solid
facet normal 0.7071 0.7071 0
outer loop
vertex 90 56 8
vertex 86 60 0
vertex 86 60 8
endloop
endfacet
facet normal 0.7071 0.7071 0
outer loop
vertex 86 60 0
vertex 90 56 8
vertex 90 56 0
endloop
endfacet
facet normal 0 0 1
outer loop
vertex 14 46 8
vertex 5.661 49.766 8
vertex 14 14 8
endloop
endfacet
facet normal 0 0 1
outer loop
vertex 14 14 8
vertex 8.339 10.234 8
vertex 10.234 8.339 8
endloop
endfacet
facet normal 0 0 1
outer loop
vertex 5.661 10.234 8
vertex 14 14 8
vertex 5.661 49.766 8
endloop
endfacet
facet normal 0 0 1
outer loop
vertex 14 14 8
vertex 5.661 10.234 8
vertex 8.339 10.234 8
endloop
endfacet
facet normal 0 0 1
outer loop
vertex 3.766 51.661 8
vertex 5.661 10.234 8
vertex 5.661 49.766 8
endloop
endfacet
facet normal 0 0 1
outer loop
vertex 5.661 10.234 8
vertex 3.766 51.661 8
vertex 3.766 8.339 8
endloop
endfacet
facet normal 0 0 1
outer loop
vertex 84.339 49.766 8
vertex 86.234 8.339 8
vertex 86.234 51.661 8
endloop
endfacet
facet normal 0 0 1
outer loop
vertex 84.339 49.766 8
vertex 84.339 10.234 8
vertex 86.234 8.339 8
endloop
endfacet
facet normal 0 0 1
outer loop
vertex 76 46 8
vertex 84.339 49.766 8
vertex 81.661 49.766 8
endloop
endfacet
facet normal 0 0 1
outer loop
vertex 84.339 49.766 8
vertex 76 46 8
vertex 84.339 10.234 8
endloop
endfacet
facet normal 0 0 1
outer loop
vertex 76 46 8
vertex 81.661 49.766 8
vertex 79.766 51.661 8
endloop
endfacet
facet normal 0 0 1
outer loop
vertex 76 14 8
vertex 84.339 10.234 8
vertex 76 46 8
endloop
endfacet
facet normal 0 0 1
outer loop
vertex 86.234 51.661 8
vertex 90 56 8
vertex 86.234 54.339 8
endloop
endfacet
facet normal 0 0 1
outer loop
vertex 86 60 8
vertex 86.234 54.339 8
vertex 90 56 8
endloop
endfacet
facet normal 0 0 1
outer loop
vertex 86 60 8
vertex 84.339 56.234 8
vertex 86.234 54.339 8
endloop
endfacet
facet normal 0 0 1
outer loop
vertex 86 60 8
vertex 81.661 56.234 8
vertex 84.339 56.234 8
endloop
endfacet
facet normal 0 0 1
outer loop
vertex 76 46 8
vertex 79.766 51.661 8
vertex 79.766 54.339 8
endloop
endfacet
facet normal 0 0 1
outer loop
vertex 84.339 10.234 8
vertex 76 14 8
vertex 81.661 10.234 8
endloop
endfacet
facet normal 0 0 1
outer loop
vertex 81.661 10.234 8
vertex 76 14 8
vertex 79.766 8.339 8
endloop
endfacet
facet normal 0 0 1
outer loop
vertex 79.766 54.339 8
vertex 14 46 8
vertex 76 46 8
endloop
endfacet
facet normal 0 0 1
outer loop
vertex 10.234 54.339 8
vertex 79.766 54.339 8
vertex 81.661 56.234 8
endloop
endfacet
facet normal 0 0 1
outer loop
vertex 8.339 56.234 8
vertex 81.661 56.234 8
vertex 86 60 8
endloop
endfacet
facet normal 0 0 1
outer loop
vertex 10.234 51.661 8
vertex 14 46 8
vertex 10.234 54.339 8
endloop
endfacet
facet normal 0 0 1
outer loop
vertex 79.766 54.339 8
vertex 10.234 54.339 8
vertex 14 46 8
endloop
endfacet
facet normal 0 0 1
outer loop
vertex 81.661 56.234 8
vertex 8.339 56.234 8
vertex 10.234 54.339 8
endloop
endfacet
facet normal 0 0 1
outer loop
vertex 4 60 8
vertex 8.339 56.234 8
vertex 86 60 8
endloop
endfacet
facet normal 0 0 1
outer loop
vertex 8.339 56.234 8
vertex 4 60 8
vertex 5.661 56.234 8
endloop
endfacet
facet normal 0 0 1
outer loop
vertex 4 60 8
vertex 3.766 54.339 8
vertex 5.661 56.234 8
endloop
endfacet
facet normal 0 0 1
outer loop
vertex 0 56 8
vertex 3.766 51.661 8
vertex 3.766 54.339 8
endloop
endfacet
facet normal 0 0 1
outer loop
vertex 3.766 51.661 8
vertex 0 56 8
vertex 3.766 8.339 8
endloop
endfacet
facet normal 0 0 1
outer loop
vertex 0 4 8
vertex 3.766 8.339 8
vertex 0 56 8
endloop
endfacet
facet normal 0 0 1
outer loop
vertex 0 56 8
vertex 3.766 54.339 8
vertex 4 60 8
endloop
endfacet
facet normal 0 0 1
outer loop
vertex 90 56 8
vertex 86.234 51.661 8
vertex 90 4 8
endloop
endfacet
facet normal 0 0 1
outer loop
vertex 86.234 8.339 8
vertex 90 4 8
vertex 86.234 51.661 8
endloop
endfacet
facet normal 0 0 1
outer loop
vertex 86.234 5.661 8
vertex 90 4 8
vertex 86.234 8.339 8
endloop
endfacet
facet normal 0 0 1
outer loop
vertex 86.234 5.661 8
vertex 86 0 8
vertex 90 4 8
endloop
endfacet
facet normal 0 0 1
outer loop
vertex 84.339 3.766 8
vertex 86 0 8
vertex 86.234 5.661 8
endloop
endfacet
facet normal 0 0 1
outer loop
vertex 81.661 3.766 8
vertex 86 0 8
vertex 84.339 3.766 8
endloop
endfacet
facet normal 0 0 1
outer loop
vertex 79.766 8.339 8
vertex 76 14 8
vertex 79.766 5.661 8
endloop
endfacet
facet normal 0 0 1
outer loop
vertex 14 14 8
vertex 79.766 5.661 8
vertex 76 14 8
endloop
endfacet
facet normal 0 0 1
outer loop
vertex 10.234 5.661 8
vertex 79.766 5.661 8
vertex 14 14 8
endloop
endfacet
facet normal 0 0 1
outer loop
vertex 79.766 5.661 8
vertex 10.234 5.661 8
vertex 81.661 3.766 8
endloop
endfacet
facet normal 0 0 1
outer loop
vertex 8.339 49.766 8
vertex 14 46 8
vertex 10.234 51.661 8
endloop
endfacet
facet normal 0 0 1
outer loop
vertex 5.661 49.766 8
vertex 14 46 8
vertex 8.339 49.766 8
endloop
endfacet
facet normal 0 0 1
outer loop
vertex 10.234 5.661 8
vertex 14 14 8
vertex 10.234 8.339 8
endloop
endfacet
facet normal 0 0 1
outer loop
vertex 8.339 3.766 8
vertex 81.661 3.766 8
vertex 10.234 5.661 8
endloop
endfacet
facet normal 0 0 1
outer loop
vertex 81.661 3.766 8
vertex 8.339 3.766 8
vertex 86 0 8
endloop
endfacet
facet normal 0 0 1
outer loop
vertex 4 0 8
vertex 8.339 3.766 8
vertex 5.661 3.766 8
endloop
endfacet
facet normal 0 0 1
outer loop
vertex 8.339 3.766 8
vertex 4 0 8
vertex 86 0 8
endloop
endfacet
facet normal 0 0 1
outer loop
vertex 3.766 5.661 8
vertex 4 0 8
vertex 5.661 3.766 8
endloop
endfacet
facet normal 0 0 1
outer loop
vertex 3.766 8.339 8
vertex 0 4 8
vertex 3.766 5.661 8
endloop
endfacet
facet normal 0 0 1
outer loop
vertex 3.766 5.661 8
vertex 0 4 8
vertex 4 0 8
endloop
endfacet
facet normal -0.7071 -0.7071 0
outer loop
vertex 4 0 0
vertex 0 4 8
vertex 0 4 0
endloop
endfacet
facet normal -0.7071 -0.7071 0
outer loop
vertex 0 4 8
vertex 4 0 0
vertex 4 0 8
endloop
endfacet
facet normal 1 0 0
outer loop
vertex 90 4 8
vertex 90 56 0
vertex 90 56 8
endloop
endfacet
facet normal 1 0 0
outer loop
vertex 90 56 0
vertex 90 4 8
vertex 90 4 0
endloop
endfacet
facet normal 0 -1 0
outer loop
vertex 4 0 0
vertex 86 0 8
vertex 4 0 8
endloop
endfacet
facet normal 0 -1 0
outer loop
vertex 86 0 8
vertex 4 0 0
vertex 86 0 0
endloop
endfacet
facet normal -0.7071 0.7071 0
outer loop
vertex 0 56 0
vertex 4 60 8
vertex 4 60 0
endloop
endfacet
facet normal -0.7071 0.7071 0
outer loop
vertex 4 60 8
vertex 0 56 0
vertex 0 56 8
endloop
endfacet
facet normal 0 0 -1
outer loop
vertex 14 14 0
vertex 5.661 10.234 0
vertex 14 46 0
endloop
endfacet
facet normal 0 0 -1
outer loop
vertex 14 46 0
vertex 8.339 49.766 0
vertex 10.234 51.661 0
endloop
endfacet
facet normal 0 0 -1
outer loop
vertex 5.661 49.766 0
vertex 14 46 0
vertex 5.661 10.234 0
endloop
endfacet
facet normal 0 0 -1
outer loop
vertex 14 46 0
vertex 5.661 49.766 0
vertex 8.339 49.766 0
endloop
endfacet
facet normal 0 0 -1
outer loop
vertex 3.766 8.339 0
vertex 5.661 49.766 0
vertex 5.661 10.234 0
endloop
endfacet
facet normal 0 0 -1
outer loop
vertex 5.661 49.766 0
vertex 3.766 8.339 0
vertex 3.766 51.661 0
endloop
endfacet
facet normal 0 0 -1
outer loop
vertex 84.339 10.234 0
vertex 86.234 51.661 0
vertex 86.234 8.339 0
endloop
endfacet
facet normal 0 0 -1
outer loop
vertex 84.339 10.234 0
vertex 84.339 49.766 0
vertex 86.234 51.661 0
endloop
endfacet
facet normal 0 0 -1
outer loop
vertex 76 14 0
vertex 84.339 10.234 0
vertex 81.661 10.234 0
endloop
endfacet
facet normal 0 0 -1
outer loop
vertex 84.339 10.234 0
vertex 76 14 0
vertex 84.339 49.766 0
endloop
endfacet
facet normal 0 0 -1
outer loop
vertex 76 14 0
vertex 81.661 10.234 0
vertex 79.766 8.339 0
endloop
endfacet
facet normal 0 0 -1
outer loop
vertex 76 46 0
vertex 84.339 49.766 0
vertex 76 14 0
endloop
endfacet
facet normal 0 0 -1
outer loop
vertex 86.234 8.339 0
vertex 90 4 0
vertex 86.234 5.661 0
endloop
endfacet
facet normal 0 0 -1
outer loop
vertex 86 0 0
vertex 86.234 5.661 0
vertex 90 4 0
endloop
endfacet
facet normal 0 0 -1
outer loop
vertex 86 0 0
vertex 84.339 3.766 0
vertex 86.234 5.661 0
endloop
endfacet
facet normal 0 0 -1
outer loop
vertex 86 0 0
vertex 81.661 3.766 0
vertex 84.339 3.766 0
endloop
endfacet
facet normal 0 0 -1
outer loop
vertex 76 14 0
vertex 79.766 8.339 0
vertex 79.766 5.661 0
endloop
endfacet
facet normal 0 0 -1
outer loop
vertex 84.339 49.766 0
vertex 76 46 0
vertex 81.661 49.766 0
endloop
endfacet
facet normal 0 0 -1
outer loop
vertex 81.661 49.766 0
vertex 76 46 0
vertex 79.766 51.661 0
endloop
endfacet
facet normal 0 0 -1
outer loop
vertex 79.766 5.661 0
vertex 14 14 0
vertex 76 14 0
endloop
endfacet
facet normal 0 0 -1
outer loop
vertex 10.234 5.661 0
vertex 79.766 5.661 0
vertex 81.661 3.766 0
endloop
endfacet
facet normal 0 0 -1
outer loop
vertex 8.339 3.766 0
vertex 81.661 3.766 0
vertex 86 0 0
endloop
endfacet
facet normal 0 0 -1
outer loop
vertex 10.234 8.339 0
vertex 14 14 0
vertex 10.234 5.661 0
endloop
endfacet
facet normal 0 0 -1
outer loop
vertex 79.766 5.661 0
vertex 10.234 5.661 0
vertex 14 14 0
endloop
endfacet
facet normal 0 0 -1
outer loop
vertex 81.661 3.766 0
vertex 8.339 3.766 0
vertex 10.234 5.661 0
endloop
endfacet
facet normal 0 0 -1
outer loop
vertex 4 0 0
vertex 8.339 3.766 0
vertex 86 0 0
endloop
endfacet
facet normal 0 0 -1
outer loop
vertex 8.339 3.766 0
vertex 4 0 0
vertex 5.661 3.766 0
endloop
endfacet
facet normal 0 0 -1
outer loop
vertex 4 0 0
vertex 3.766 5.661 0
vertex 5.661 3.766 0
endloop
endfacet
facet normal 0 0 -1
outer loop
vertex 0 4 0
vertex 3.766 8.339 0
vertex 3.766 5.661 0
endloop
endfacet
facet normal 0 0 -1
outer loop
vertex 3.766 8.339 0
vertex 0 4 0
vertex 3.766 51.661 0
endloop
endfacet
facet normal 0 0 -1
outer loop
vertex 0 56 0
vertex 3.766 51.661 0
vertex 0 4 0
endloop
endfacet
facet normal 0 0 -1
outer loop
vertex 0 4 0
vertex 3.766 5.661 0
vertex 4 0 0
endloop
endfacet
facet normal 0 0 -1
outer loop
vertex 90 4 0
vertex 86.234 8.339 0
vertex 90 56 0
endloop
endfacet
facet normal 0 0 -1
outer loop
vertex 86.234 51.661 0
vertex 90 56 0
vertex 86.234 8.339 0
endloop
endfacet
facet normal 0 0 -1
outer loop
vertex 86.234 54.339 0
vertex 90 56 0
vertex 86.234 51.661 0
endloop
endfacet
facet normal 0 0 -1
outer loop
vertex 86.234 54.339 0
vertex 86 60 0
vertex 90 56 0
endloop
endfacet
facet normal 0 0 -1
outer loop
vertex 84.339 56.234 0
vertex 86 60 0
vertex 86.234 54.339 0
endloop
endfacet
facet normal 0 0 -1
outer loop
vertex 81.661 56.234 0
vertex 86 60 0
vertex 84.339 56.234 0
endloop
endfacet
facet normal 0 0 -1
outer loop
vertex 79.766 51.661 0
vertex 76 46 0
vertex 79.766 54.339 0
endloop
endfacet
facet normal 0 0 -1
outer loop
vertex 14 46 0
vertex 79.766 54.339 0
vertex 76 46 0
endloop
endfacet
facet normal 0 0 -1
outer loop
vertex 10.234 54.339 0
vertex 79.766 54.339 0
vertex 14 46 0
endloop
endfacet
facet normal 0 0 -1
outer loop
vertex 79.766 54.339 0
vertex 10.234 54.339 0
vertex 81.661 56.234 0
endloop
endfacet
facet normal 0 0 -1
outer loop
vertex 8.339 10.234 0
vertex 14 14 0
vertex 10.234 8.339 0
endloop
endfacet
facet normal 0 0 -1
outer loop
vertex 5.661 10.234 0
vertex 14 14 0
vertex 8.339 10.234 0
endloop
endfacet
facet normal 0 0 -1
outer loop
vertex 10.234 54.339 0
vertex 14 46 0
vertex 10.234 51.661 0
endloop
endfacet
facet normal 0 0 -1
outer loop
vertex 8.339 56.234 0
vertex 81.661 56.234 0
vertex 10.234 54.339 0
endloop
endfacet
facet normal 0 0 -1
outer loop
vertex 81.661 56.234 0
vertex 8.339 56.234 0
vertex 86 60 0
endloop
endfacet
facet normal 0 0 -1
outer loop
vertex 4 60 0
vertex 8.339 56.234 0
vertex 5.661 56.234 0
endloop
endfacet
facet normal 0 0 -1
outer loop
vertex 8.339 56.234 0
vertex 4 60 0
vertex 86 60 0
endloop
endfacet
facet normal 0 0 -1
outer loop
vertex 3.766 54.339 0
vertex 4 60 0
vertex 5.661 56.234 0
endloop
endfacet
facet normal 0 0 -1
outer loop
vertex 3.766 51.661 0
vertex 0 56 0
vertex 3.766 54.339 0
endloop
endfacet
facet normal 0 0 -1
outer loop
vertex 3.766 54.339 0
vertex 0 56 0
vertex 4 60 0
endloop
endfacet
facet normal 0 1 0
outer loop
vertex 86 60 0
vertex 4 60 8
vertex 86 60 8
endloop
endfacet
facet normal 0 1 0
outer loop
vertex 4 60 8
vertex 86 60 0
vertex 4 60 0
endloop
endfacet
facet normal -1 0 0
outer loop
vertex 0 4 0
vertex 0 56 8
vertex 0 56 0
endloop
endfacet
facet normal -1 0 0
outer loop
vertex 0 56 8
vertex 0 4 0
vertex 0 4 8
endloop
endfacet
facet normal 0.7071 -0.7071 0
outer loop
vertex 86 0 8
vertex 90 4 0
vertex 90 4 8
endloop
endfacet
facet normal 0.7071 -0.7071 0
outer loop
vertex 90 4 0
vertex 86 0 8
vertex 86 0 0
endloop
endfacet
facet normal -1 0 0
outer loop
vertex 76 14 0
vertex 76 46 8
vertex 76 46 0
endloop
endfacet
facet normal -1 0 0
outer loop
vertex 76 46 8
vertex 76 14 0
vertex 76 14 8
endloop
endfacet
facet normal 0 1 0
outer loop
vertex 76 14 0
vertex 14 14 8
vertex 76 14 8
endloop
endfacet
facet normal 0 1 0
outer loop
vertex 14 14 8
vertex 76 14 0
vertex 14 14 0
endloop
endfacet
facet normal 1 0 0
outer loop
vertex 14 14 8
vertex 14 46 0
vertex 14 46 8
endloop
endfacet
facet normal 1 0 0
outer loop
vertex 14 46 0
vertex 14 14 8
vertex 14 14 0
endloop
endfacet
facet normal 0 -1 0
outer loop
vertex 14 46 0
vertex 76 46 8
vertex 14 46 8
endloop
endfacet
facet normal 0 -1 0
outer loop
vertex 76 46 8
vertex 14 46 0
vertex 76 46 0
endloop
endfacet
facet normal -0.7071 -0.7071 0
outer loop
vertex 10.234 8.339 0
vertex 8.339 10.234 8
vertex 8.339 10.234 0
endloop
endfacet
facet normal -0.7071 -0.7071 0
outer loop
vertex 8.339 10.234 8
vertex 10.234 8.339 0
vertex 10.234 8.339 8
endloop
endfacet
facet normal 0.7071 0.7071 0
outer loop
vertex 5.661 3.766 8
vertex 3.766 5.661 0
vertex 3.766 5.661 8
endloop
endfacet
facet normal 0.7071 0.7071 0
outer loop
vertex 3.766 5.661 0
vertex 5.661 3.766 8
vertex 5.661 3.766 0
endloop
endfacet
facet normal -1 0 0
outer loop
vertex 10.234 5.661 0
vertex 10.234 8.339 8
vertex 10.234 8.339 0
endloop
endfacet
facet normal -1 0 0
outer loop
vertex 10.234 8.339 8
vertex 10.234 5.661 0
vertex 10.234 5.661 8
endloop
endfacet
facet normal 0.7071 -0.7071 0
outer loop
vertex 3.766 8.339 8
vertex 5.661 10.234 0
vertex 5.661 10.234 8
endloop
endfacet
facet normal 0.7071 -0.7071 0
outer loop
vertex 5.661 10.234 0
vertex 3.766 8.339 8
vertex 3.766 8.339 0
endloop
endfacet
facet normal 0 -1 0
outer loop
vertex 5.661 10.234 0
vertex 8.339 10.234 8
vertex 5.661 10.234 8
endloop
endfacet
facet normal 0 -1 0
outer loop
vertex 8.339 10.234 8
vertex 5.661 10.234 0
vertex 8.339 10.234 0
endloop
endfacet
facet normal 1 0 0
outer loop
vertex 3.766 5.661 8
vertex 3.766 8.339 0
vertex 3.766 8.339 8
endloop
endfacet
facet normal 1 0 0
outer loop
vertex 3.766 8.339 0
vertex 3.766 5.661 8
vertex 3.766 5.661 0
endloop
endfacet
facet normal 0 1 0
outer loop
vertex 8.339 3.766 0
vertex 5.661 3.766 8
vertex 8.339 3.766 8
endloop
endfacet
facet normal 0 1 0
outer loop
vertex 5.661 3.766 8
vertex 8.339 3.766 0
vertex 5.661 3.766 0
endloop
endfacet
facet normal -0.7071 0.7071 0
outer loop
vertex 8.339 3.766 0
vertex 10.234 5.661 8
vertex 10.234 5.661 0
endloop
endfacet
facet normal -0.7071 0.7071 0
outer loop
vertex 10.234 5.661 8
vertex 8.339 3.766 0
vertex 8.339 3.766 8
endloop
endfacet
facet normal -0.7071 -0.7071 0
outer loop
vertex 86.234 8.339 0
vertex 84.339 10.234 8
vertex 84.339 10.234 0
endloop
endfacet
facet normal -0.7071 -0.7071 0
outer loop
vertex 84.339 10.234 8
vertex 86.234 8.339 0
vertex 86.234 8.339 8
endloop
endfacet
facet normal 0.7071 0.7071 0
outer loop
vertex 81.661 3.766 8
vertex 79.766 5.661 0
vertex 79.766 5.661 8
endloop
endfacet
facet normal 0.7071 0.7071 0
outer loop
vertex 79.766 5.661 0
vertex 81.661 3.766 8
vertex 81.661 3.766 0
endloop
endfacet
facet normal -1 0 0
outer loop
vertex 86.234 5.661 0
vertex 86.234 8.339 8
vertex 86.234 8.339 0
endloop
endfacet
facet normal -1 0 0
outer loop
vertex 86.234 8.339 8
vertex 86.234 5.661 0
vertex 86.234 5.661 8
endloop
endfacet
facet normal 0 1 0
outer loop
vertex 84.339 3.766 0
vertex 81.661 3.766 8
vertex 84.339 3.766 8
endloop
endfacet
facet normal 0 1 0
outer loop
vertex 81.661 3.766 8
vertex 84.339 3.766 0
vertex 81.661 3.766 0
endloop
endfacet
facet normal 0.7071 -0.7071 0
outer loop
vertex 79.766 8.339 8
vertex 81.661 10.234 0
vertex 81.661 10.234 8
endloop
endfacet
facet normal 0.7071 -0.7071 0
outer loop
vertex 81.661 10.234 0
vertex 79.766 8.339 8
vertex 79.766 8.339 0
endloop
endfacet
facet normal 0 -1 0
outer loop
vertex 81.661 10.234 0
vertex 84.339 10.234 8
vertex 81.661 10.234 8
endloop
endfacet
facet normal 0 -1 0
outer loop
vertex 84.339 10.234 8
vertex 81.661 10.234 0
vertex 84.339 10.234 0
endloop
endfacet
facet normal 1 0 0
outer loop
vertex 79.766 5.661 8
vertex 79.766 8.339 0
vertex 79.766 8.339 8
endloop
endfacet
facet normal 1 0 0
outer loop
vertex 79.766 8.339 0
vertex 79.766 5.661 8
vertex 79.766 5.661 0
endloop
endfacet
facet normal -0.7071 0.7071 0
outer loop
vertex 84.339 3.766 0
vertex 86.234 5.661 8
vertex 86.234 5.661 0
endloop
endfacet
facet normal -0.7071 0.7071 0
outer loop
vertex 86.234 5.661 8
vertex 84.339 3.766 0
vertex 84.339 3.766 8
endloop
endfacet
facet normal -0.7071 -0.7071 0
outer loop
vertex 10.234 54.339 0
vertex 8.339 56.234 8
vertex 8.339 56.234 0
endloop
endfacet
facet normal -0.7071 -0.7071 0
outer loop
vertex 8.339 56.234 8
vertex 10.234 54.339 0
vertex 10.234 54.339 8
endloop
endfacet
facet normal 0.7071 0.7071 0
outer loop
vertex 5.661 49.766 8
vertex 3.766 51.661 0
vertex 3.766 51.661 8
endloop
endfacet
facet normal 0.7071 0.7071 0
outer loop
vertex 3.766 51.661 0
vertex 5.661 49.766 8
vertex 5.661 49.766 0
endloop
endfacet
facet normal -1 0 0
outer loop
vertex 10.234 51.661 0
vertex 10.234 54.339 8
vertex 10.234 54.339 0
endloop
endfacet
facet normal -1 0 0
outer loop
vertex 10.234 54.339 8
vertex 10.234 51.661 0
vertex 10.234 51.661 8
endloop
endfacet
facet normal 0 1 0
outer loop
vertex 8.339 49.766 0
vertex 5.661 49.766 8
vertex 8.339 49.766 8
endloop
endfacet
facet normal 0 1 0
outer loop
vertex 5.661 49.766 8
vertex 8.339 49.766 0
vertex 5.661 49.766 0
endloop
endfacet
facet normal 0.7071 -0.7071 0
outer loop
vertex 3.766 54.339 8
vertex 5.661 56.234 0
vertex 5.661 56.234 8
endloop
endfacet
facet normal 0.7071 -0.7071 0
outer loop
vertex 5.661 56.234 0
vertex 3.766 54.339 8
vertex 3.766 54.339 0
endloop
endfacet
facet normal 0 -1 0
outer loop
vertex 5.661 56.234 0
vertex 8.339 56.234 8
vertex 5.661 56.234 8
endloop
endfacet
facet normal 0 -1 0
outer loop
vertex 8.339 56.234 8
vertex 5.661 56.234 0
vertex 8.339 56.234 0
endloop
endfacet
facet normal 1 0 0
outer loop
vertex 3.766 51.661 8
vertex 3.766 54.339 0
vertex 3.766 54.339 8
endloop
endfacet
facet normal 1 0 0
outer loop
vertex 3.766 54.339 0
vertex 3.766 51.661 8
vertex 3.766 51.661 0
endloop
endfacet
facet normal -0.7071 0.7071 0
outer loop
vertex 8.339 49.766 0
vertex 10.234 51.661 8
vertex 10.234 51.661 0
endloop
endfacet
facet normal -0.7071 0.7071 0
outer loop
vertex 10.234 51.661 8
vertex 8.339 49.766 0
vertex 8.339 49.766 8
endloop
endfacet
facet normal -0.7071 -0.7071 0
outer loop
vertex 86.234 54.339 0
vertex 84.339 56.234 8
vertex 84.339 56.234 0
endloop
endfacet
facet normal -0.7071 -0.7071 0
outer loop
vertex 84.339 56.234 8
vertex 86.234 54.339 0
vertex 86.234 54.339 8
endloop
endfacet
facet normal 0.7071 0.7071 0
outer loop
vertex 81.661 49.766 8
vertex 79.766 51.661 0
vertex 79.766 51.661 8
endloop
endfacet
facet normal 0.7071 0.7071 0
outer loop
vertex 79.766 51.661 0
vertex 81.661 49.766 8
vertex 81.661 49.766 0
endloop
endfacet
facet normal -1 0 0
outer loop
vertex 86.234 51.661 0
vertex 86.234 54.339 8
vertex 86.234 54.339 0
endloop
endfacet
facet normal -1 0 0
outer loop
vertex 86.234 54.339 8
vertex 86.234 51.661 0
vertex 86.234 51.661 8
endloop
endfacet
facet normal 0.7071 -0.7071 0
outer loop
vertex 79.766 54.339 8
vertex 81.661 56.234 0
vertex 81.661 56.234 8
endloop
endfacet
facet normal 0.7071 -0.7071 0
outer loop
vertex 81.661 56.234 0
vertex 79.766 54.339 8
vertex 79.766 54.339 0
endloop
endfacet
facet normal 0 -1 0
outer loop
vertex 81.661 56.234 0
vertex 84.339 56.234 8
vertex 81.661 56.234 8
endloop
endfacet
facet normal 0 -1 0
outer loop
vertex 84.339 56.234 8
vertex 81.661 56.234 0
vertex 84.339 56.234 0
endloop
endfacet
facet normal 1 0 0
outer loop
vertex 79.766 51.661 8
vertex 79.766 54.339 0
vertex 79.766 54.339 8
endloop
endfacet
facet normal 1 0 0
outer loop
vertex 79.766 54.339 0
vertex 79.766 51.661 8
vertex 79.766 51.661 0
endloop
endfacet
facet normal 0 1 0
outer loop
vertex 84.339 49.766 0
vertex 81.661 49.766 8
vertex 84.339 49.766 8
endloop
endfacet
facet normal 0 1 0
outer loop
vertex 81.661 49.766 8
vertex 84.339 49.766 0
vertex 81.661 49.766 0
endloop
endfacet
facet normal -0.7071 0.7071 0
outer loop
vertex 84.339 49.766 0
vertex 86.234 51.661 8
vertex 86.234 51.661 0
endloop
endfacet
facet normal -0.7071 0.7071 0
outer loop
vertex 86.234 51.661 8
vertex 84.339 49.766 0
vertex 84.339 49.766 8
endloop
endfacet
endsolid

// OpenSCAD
$fn = 32;

// ----------------------------------------------------------------------
// Frame plate: 90 x 60 frame, 14 mm rails
// ----------------------------------------------------------------------

// --- parameters (mm) ---
plate_l = 90;             // plate length, X
plate_w = 60;             // plate width, Y
plate_t = 8;              // plate thickness, Z (extrusion height)
corner_c = 4;             // corner chamfer
frame_bar = 14;           // frame rail width
bolt_r = 3.5;             // corner bolt window radius
bolt_inset = 7;           // bolt centre inset from the edges

win_l = plate_l - 2 * frame_bar;  // window length
win_w = plate_w - 2 * frame_bar;  // window width
bolt_d = 2 * bolt_r;  // corner hole diameter

profile = [[4, 0], [86, 0], [90, 4], [90, 56], [86, 60], [4, 60], [0, 56], [0, 4]];  // primary outline, 8 points, counter clockwise
void_1 = [[14, 14], [76, 14], [76, 46], [14, 46]];  // the window, 4 points
void_2 = [[10.234, 8.339], [8.339, 10.234], [5.661, 10.234], [3.766, 8.339], [3.766, 5.661], [5.661, 3.766], [8.339, 3.766], [10.234, 5.661]];  // corner bolt window, 8 points
void_3 = [[86.234, 8.339], [84.339, 10.234], [81.661, 10.234], [79.766, 8.339], [79.766, 5.661], [81.661, 3.766], [84.339, 3.766], [86.234, 5.661]];  // corner bolt window, 8 points
void_4 = [[10.234, 54.339], [8.339, 56.234], [5.661, 56.234], [3.766, 54.339], [3.766, 51.661], [5.661, 49.766], [8.339, 49.766], [10.234, 51.661]];  // corner bolt window, 8 points
void_5 = [[86.234, 54.339], [84.339, 56.234], [81.661, 56.234], [79.766, 54.339], [79.766, 51.661], [81.661, 49.766], [84.339, 49.766], [86.234, 51.661]];  // corner bolt window, 8 points

// --- the one profile operation ---
difference() {
  linear_extrude(height = plate_t) polygon(points = profile);
  translate([0, 0, -1])
    linear_extrude(height = plate_t + 2) polygon(points = void_1);
  translate([0, 0, -1])
    linear_extrude(height = plate_t + 2) polygon(points = void_2);
  translate([0, 0, -1])
    linear_extrude(height = plate_t + 2) polygon(points = void_3);
  translate([0, 0, -1])
    linear_extrude(height = plate_t + 2) polygon(points = void_4);
  translate([0, 0, -1])
    linear_extrude(height = plate_t + 2) polygon(points = void_5);
}
